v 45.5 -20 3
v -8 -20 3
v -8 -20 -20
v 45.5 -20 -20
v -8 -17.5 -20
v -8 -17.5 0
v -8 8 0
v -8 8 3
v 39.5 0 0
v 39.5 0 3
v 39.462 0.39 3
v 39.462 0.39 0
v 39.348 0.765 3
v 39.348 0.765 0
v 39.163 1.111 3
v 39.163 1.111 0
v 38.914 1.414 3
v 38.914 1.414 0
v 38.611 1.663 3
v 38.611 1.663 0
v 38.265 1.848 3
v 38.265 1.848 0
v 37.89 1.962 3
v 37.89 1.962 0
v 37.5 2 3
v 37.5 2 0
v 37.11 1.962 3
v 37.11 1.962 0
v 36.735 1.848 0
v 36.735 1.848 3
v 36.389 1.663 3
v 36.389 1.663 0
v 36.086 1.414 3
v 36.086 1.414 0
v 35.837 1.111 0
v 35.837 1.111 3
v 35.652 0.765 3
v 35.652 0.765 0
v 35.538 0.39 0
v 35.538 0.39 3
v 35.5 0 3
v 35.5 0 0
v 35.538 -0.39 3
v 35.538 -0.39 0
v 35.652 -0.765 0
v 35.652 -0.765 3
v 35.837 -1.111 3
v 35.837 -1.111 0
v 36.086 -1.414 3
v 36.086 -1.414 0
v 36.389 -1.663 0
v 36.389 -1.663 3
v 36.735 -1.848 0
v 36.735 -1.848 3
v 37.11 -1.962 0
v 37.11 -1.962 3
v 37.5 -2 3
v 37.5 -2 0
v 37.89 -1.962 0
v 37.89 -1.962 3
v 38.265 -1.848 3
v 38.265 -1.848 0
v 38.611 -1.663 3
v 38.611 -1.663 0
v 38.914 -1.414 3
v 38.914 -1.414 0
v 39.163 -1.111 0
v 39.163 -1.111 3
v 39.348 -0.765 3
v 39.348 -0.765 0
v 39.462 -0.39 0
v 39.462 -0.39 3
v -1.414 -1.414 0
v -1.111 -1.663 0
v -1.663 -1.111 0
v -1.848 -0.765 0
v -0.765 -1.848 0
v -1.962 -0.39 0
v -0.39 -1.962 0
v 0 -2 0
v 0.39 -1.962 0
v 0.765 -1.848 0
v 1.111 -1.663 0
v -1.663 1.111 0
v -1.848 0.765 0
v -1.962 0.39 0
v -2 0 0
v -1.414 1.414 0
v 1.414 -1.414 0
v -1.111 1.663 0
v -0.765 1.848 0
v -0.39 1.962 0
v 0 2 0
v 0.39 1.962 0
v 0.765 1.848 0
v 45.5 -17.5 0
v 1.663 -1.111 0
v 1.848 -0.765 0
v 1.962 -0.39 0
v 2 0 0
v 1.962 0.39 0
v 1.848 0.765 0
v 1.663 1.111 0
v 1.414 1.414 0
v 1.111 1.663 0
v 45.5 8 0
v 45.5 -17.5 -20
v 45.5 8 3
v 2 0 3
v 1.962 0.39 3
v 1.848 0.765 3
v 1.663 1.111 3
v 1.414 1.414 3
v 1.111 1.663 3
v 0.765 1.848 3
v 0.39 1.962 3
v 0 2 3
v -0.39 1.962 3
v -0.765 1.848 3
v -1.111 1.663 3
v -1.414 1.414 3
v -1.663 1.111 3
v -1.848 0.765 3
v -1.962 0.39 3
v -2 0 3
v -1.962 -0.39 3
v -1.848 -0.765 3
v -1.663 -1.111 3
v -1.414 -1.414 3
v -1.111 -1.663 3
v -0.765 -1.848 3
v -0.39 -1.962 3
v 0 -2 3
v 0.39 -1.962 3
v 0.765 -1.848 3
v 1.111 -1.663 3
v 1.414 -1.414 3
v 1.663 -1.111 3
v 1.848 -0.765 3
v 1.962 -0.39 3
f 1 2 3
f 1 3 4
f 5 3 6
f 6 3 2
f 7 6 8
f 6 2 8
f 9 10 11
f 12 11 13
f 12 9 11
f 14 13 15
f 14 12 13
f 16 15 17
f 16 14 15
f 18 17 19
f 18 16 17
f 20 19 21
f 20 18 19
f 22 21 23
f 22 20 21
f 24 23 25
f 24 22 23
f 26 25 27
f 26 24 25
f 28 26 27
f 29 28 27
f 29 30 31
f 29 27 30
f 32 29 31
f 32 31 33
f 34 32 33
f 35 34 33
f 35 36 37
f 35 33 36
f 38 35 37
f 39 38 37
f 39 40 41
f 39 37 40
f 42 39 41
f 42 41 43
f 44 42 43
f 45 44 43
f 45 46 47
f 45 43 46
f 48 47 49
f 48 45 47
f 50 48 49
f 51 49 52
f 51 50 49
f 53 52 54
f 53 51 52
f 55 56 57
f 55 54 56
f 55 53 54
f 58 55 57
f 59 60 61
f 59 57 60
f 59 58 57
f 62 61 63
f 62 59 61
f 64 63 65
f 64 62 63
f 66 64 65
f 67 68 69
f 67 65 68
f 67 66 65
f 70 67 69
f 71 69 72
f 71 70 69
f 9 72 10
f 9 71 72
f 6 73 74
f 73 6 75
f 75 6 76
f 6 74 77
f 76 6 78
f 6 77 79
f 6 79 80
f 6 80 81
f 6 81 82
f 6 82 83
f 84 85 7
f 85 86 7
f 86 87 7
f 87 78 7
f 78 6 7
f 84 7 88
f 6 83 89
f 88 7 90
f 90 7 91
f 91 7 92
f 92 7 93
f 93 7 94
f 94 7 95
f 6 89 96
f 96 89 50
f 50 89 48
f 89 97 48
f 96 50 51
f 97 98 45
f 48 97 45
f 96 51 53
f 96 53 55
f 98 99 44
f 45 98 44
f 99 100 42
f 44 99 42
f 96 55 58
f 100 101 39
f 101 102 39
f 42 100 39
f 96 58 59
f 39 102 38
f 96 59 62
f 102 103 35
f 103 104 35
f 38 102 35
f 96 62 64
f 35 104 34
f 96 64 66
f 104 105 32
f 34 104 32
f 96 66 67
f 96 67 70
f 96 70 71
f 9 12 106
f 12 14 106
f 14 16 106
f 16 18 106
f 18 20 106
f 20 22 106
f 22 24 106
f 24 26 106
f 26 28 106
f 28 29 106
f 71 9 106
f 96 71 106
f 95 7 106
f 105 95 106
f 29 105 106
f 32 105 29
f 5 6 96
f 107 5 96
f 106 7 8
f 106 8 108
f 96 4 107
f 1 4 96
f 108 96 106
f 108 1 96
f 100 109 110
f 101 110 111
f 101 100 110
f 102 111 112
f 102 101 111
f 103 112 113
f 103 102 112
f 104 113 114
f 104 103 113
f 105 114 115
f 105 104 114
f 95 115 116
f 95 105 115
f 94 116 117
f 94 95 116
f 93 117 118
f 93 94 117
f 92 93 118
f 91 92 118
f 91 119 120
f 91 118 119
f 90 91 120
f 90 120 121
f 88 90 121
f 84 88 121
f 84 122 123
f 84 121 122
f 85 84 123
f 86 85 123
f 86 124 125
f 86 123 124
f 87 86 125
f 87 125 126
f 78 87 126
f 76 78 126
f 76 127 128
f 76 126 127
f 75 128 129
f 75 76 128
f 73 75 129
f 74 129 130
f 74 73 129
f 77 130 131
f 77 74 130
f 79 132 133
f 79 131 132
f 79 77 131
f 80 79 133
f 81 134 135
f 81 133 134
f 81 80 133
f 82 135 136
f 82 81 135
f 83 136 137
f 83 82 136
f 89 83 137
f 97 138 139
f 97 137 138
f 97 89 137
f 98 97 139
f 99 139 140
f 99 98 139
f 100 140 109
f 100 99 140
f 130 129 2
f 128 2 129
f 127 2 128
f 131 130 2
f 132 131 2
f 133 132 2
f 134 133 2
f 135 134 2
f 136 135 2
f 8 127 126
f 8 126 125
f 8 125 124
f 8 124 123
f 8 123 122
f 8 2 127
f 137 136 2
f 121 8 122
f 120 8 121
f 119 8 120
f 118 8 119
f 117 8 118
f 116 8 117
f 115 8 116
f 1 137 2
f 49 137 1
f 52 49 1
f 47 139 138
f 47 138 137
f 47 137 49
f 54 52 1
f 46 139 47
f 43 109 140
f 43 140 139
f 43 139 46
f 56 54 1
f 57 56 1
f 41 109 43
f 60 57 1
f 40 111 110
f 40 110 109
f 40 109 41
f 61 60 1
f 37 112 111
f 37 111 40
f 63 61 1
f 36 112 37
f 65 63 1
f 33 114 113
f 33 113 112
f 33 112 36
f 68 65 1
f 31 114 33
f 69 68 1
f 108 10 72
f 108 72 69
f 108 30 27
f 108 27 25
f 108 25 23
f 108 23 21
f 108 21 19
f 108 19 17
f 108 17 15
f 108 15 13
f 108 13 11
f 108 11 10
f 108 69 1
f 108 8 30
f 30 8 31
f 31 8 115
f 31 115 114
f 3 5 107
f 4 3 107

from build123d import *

# Parameters (mm, degrees)
SKETCH002_W     = 53.5
SKETCH002_H     = 28
PAD_DEPTH       = 3
SKETCH_R        = 2
POCKET_DEPTH    = 5
SKETCH001_R     = 2
POCKET001_DEPTH = 5
SKETCH003_W     = 53.5
SKETCH003_H     = 2.5
PAD001_DEPTH    = 20


with BuildPart() as part:
    # Sketch002 → Pad (new body)
    with BuildSketch(Plane.XY):
        with Locations((18.75, -6)):
            Rectangle(SKETCH002_W, SKETCH002_H)
    extrude(amount=PAD_DEPTH)

    # Sketch → Pocket (cut)
    with BuildSketch(Plane.XY):
        Circle(SKETCH_R)
    extrude(amount=POCKET_DEPTH, mode=Mode.SUBTRACT)

    # Sketch001 → Pocket001 (cut)
    with BuildSketch(Plane.XY):
        with Locations((37.5, 0)):
            Circle(SKETCH001_R)
    extrude(amount=POCKET001_DEPTH, mode=Mode.SUBTRACT)

    # Sketch003 → Pad001 (join)
    with BuildSketch(Plane.XY):
        with Locations((18.75, -18.75)):
            Rectangle(SKETCH003_W, SKETCH003_H)
    extrude(amount=-PAD001_DEPTH)


solid = part.part
